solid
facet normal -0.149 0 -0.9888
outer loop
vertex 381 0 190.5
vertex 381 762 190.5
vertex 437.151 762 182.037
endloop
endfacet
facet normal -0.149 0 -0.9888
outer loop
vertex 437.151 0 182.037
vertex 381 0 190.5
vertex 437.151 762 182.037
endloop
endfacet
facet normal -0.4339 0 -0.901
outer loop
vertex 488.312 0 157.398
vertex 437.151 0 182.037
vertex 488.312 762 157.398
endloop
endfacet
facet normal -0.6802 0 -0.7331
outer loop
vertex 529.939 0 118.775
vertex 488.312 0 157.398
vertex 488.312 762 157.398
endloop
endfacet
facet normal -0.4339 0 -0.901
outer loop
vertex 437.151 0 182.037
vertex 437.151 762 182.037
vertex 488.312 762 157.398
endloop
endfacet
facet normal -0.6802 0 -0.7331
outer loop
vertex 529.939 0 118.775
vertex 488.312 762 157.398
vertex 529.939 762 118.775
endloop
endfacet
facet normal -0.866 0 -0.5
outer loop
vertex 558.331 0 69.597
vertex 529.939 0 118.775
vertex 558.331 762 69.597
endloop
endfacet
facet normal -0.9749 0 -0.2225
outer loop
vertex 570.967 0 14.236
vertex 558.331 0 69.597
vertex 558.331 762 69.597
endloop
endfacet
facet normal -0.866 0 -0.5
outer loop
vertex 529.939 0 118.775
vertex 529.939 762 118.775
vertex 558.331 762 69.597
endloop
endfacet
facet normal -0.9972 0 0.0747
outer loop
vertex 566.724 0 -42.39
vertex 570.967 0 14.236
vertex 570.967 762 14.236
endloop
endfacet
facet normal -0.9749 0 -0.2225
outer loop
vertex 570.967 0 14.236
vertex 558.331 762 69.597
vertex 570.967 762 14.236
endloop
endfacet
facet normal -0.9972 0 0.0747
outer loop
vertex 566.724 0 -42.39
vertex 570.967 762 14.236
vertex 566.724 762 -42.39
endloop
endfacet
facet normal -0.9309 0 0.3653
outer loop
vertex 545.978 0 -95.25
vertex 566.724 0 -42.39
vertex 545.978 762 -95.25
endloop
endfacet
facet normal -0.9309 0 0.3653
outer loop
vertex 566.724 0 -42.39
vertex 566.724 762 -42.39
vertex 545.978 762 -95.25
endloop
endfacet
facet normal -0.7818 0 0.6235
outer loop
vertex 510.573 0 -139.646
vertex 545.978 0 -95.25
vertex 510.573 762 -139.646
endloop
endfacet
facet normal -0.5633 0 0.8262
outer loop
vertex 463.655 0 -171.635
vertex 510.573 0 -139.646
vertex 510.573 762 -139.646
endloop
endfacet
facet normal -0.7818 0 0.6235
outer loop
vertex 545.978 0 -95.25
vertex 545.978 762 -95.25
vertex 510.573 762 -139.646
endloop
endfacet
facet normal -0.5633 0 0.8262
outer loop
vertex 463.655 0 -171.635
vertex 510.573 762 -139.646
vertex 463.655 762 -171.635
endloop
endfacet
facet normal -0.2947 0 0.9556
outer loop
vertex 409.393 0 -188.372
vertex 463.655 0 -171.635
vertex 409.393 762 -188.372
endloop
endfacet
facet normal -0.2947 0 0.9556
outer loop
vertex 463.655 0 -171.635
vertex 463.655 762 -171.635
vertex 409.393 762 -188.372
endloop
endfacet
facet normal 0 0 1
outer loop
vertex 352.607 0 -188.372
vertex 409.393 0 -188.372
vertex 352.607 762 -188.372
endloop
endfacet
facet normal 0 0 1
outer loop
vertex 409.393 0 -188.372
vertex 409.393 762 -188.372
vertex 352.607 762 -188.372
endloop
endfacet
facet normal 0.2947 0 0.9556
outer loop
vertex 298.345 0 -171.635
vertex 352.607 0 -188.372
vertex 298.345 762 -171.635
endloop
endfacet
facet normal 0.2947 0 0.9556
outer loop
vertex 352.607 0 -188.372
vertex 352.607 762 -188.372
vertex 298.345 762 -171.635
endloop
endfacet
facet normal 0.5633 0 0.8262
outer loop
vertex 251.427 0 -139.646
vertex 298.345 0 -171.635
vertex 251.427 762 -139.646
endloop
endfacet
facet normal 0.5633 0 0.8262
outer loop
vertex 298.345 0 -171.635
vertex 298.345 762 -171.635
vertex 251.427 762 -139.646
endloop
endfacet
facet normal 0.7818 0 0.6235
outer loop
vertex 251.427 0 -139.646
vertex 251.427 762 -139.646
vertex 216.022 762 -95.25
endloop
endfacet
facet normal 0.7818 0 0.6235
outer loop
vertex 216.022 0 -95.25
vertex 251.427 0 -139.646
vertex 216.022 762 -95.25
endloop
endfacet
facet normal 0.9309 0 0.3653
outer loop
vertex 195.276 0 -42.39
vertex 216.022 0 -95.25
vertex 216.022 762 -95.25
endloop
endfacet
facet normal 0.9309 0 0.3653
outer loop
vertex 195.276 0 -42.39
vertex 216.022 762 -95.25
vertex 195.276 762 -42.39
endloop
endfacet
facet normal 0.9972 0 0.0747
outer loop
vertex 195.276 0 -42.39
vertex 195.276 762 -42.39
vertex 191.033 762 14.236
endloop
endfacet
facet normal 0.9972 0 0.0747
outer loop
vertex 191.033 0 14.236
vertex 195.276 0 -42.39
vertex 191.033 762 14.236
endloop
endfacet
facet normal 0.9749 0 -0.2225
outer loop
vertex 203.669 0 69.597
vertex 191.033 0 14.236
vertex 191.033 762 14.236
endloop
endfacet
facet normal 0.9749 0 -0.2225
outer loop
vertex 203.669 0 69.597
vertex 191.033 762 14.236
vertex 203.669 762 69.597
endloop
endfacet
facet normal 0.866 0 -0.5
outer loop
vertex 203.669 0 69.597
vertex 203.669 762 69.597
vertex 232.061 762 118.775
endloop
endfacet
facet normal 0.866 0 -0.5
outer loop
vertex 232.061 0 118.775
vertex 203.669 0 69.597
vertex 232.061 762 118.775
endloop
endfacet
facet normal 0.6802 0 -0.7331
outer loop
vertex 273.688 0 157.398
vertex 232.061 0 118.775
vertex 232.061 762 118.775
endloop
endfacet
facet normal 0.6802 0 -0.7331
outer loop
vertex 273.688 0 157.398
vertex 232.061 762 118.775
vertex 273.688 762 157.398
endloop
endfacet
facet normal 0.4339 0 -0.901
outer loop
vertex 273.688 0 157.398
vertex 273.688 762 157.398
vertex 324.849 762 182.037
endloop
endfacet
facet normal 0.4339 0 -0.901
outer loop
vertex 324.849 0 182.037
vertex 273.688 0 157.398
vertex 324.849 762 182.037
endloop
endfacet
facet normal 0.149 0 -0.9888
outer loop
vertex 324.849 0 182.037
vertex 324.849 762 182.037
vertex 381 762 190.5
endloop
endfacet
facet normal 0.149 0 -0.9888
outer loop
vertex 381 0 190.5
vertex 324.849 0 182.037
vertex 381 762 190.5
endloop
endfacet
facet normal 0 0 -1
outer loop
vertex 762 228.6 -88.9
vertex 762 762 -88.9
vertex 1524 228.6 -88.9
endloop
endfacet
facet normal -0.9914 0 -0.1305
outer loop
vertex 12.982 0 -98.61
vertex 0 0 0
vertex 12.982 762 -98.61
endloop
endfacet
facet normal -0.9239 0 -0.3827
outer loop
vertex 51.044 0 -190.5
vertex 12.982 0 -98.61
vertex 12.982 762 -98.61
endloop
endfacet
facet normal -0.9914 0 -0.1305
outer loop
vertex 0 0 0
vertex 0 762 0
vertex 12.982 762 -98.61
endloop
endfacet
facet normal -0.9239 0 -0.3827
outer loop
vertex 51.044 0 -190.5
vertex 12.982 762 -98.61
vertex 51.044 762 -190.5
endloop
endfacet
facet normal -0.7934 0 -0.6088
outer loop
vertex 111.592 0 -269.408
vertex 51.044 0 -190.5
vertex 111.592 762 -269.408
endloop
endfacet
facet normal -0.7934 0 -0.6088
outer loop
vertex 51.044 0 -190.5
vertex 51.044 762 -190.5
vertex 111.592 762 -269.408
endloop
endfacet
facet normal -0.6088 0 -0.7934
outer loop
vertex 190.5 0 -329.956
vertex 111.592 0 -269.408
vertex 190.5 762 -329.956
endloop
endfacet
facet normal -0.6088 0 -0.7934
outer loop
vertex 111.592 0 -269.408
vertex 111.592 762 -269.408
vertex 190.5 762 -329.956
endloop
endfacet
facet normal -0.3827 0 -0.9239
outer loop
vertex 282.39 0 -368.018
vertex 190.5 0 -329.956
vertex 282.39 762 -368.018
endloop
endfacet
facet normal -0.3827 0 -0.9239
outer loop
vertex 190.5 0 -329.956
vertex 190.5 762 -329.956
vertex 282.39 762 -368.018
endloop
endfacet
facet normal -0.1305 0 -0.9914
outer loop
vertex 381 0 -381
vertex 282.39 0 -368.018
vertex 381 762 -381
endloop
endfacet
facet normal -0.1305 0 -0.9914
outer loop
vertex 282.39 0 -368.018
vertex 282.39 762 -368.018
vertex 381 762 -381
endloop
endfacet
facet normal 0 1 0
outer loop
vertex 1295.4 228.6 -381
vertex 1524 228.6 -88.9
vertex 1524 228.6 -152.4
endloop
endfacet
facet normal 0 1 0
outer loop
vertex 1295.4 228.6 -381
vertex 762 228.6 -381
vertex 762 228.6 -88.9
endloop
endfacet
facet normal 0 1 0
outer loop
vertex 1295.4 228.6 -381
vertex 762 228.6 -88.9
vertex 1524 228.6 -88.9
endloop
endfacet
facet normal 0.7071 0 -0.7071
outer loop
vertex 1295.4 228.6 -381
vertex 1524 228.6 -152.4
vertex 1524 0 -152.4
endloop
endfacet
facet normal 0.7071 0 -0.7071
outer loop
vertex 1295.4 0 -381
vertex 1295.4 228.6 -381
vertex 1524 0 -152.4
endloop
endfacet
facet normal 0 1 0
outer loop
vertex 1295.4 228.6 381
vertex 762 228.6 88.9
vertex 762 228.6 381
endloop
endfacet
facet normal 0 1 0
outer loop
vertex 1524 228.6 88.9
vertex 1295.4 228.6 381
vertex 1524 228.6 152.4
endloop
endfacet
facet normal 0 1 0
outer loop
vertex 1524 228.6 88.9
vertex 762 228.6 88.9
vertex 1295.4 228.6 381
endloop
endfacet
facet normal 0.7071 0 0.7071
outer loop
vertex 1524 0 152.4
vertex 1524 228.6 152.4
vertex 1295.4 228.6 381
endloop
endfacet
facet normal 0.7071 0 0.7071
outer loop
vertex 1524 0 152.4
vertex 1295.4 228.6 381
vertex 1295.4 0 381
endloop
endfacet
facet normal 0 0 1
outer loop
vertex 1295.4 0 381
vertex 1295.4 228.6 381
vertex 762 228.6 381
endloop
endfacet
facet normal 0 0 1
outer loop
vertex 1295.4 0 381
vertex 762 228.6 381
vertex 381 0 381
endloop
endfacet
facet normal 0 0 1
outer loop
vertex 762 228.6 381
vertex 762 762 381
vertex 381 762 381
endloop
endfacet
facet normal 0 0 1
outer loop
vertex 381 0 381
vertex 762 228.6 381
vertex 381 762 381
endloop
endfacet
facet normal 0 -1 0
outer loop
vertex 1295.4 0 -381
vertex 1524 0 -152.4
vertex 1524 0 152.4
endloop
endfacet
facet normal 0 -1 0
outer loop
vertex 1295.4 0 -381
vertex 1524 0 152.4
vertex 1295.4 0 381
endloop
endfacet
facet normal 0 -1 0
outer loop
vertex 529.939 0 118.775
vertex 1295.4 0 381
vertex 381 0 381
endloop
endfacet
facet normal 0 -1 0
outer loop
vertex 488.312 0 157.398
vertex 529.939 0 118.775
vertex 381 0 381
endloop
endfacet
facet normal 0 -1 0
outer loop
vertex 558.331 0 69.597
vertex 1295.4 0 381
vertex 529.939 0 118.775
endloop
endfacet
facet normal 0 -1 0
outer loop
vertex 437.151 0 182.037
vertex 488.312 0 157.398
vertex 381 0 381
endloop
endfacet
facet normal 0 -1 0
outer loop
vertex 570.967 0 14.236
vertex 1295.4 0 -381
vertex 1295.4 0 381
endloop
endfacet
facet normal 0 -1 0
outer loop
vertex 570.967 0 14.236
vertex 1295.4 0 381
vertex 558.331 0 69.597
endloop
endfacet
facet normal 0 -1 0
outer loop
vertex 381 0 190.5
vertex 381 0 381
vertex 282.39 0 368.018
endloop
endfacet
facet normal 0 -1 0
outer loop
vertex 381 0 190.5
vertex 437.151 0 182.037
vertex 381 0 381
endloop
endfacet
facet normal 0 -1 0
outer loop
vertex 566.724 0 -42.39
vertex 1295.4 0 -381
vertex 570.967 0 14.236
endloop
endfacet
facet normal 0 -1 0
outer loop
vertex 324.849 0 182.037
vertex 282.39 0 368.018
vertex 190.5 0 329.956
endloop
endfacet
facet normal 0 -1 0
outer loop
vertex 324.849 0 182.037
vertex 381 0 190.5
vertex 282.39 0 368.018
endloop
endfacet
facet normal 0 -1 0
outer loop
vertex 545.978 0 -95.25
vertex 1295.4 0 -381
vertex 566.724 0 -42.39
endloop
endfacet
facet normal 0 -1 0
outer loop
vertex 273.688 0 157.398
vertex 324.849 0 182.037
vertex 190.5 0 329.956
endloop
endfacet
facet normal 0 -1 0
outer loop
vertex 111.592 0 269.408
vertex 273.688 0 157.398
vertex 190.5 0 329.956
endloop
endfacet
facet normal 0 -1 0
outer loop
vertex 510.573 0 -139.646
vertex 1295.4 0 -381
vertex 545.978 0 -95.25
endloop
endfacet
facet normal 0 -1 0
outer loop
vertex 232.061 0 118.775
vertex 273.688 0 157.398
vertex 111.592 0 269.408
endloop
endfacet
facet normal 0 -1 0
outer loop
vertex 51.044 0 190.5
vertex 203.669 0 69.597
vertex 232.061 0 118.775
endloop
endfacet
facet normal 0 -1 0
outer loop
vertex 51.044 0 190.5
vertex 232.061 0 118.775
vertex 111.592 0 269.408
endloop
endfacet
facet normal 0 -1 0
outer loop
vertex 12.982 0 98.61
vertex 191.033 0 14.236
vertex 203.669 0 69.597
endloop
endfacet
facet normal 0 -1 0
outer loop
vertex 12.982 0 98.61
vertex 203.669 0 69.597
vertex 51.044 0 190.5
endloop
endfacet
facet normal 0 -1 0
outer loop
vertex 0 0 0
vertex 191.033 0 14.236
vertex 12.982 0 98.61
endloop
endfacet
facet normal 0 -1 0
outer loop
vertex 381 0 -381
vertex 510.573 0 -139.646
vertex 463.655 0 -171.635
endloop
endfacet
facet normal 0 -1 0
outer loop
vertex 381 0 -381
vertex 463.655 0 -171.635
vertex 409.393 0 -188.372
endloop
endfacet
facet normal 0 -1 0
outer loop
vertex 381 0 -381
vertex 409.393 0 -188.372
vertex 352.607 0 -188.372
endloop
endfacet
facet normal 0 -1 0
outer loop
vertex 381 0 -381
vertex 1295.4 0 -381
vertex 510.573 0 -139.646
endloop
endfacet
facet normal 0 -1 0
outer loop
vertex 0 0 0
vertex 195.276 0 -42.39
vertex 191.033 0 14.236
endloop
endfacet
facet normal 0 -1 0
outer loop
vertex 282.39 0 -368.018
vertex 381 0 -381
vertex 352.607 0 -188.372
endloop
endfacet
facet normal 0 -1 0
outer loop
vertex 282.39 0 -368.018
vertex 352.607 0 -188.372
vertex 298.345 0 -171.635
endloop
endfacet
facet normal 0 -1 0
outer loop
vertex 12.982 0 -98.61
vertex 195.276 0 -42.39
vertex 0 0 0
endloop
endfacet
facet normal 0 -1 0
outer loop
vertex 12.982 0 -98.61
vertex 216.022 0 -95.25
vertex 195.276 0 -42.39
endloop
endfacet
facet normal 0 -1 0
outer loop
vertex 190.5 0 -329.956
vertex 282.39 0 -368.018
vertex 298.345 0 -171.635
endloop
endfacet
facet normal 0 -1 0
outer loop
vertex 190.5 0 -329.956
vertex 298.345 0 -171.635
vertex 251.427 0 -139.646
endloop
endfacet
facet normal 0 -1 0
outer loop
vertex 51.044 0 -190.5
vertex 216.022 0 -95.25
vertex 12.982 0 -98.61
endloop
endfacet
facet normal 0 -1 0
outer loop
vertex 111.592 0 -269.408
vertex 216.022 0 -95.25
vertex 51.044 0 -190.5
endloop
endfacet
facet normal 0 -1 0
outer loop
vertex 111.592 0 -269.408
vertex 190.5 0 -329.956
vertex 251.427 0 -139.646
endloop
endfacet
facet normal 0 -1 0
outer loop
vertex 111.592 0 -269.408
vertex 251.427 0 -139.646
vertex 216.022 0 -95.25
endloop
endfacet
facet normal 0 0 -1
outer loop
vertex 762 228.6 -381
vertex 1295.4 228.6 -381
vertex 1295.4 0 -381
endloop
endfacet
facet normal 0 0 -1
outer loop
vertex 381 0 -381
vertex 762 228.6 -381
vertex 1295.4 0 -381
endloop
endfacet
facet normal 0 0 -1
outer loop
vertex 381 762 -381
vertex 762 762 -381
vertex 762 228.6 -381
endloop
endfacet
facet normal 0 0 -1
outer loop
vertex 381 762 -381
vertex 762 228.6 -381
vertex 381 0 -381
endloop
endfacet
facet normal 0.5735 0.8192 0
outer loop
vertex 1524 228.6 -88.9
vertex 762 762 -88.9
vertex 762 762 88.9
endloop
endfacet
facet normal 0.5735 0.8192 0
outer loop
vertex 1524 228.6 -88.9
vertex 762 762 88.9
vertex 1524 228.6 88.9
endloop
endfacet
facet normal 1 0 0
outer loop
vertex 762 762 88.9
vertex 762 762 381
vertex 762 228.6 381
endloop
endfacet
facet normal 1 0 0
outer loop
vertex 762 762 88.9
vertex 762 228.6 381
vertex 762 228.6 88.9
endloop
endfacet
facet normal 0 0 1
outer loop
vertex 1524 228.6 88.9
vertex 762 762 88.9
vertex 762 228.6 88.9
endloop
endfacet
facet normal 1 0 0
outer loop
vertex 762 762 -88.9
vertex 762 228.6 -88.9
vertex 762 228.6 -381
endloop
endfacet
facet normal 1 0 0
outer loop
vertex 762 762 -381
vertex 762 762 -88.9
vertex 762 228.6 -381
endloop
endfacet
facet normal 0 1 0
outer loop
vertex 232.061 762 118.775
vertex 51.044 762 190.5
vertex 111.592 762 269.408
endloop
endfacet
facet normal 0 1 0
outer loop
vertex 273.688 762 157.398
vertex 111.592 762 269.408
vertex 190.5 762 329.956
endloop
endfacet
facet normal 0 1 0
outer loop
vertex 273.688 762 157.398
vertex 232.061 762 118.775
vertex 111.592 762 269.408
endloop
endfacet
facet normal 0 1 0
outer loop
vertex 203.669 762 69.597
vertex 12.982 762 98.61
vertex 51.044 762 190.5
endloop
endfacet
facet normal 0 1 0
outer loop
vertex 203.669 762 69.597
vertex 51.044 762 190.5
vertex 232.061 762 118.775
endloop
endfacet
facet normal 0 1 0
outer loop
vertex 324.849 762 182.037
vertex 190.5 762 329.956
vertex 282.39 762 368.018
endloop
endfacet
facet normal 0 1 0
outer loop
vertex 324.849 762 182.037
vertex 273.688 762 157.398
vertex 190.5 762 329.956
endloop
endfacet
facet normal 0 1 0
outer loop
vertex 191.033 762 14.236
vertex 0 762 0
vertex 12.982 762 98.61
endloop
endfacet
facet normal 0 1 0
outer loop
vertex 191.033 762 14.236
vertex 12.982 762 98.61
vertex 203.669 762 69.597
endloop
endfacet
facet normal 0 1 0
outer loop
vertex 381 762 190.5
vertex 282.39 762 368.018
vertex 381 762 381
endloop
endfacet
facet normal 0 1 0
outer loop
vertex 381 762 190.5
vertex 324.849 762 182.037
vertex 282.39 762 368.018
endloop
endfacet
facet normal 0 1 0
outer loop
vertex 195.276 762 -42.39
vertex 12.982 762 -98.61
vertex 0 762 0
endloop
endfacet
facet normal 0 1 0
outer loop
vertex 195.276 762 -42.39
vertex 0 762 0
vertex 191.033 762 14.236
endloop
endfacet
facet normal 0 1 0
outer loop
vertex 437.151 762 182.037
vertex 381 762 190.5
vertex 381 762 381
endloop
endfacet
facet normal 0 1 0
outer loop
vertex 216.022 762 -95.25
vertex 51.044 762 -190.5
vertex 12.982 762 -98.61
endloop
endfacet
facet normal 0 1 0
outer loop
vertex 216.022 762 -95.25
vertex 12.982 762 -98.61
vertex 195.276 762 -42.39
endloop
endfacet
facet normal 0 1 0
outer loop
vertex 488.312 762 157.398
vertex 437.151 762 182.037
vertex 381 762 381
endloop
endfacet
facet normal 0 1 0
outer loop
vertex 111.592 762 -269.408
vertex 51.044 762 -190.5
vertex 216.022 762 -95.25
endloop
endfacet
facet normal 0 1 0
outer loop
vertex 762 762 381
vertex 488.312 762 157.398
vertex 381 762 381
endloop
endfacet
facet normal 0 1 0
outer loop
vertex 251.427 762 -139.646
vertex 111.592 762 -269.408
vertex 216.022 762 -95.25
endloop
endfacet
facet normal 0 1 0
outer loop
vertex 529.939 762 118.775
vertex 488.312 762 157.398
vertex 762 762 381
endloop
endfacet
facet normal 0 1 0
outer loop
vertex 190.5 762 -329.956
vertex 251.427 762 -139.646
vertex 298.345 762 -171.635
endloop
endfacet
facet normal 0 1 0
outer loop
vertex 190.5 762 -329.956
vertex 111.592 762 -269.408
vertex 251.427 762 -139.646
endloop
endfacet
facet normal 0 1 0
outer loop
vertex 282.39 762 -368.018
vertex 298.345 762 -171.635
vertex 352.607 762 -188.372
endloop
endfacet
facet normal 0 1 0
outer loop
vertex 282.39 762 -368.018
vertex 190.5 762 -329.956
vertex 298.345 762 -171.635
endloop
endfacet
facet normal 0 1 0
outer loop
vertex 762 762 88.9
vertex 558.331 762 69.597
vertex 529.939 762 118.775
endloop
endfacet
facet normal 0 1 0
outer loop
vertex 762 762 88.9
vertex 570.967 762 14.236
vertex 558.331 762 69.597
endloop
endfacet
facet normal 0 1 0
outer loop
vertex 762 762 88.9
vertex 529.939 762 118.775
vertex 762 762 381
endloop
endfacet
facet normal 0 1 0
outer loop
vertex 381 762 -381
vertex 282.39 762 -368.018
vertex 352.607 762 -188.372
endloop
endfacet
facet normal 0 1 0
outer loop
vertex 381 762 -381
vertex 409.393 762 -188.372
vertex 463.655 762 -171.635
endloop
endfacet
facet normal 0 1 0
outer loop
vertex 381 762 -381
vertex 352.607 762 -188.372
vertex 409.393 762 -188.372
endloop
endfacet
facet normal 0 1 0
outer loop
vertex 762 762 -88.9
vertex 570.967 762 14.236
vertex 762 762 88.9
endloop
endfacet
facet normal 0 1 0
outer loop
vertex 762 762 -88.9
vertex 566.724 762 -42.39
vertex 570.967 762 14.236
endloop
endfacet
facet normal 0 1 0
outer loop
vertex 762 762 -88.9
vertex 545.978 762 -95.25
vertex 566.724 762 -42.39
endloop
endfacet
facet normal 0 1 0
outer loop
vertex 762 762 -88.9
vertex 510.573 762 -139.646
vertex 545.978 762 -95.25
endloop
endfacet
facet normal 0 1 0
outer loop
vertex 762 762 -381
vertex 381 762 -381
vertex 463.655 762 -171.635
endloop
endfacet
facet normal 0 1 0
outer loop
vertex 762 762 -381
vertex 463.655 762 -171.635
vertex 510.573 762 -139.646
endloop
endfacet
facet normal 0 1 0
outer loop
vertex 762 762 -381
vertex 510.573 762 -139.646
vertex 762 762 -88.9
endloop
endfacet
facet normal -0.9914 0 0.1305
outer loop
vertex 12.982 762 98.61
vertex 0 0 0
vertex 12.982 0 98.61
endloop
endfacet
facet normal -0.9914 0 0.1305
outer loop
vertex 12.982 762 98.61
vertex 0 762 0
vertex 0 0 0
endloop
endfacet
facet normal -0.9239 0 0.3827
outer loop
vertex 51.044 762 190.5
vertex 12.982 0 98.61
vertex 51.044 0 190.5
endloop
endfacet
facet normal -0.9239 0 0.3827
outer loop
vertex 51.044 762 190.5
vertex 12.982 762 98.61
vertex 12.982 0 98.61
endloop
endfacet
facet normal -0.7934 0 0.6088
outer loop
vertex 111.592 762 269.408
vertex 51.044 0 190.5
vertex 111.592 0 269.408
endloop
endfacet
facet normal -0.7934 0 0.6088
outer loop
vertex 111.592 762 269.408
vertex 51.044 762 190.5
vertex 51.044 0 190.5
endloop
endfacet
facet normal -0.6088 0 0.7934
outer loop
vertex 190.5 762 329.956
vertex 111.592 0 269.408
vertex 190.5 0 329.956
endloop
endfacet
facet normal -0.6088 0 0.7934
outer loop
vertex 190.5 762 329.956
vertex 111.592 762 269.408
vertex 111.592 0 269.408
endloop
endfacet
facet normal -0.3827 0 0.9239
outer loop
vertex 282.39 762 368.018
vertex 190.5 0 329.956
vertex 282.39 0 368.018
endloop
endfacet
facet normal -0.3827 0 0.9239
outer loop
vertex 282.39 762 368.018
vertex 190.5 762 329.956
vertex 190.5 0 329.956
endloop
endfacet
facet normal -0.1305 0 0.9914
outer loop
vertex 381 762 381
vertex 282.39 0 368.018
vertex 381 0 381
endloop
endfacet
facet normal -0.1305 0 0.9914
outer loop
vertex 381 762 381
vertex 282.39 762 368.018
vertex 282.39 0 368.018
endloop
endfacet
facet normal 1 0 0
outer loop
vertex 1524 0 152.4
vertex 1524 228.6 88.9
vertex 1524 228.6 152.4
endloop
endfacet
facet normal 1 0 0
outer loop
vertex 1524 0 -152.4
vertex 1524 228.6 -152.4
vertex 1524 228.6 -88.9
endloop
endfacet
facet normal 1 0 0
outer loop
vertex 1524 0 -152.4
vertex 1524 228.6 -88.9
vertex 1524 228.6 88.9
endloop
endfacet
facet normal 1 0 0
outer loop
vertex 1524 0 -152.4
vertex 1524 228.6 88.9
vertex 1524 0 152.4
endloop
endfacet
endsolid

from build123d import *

# Parameters (mm, degrees)
BOSS_EXTRUDE2_DEPTH      = 381
BOSS_EXTRUDE2_DEPTH_BACK = 381
FILLET1_R                = 381
SKETCH2_W                = 762
SKETCH2_H                = 292.1
CUT_EXTRUDE1_DEPTH       = 533.4
SKETCH4_R                = 190.5
CUT_EXTRUDE2_DEPTH       = 1746.961339778
CHAMFER1_SIZE            = 228.6


with BuildPart() as part:
    # Sketch1 → Boss-Extrude2 (new, two sides: drawn at the far end of the back side and taken through both)
    with BuildSketch(Plane.XY.offset(-BOSS_EXTRUDE2_DEPTH_BACK)):
        Polygon((0, 0), (0, 762), (762, 762), (1524, 228.6), (1524, 0), align=None)
    extrude(amount=BOSS_EXTRUDE2_DEPTH + BOSS_EXTRUDE2_DEPTH_BACK)

    # Fillet1
    fillet1_edges = [part.edges().sort_by_distance(p)[0] for p in [
        (0, 381, -381),
        (0, 381, 381),
    ]]
    fillet(fillet1_edges, radius=FILLET1_R - 0.0001)  # a hair under: the kernel refuses the full size

    # Sketch2 → Cut-Extrude1 (cut)
    with BuildSketch(Plane(origin=(0, 762, 0), x_dir=(1, 0, 0), z_dir=(0, 1, 0))):
        with Locations((1143, 234.95)):
            Rectangle(SKETCH2_W, SKETCH2_H)
        with Locations((1143, -234.95)):
            Rectangle(SKETCH2_W, SKETCH2_H)
    extrude(amount=-CUT_EXTRUDE1_DEPTH, mode=Mode.SUBTRACT)

    # Sketch4 → Cut-Extrude2 (cut, through all)
    with BuildSketch(Plane(origin=(0, 762, 0), x_dir=(1, 0, 0), z_dir=(0, 1, 0))):
        with Locations(Location((381, 0, 0), (0, 0, 270))):
            Circle(SKETCH4_R)
    extrude(amount=-CUT_EXTRUDE2_DEPTH, mode=Mode.SUBTRACT)

    # Chamfer1
    chamfer1_edges = [part.edges().sort_by_distance(p)[0] for p in [
        (1524, 114.3, 381),
        (1524, 114.3, -381),
    ]]
    chamfer(chamfer1_edges, length=CHAMFER1_SIZE)


solid = part.part
